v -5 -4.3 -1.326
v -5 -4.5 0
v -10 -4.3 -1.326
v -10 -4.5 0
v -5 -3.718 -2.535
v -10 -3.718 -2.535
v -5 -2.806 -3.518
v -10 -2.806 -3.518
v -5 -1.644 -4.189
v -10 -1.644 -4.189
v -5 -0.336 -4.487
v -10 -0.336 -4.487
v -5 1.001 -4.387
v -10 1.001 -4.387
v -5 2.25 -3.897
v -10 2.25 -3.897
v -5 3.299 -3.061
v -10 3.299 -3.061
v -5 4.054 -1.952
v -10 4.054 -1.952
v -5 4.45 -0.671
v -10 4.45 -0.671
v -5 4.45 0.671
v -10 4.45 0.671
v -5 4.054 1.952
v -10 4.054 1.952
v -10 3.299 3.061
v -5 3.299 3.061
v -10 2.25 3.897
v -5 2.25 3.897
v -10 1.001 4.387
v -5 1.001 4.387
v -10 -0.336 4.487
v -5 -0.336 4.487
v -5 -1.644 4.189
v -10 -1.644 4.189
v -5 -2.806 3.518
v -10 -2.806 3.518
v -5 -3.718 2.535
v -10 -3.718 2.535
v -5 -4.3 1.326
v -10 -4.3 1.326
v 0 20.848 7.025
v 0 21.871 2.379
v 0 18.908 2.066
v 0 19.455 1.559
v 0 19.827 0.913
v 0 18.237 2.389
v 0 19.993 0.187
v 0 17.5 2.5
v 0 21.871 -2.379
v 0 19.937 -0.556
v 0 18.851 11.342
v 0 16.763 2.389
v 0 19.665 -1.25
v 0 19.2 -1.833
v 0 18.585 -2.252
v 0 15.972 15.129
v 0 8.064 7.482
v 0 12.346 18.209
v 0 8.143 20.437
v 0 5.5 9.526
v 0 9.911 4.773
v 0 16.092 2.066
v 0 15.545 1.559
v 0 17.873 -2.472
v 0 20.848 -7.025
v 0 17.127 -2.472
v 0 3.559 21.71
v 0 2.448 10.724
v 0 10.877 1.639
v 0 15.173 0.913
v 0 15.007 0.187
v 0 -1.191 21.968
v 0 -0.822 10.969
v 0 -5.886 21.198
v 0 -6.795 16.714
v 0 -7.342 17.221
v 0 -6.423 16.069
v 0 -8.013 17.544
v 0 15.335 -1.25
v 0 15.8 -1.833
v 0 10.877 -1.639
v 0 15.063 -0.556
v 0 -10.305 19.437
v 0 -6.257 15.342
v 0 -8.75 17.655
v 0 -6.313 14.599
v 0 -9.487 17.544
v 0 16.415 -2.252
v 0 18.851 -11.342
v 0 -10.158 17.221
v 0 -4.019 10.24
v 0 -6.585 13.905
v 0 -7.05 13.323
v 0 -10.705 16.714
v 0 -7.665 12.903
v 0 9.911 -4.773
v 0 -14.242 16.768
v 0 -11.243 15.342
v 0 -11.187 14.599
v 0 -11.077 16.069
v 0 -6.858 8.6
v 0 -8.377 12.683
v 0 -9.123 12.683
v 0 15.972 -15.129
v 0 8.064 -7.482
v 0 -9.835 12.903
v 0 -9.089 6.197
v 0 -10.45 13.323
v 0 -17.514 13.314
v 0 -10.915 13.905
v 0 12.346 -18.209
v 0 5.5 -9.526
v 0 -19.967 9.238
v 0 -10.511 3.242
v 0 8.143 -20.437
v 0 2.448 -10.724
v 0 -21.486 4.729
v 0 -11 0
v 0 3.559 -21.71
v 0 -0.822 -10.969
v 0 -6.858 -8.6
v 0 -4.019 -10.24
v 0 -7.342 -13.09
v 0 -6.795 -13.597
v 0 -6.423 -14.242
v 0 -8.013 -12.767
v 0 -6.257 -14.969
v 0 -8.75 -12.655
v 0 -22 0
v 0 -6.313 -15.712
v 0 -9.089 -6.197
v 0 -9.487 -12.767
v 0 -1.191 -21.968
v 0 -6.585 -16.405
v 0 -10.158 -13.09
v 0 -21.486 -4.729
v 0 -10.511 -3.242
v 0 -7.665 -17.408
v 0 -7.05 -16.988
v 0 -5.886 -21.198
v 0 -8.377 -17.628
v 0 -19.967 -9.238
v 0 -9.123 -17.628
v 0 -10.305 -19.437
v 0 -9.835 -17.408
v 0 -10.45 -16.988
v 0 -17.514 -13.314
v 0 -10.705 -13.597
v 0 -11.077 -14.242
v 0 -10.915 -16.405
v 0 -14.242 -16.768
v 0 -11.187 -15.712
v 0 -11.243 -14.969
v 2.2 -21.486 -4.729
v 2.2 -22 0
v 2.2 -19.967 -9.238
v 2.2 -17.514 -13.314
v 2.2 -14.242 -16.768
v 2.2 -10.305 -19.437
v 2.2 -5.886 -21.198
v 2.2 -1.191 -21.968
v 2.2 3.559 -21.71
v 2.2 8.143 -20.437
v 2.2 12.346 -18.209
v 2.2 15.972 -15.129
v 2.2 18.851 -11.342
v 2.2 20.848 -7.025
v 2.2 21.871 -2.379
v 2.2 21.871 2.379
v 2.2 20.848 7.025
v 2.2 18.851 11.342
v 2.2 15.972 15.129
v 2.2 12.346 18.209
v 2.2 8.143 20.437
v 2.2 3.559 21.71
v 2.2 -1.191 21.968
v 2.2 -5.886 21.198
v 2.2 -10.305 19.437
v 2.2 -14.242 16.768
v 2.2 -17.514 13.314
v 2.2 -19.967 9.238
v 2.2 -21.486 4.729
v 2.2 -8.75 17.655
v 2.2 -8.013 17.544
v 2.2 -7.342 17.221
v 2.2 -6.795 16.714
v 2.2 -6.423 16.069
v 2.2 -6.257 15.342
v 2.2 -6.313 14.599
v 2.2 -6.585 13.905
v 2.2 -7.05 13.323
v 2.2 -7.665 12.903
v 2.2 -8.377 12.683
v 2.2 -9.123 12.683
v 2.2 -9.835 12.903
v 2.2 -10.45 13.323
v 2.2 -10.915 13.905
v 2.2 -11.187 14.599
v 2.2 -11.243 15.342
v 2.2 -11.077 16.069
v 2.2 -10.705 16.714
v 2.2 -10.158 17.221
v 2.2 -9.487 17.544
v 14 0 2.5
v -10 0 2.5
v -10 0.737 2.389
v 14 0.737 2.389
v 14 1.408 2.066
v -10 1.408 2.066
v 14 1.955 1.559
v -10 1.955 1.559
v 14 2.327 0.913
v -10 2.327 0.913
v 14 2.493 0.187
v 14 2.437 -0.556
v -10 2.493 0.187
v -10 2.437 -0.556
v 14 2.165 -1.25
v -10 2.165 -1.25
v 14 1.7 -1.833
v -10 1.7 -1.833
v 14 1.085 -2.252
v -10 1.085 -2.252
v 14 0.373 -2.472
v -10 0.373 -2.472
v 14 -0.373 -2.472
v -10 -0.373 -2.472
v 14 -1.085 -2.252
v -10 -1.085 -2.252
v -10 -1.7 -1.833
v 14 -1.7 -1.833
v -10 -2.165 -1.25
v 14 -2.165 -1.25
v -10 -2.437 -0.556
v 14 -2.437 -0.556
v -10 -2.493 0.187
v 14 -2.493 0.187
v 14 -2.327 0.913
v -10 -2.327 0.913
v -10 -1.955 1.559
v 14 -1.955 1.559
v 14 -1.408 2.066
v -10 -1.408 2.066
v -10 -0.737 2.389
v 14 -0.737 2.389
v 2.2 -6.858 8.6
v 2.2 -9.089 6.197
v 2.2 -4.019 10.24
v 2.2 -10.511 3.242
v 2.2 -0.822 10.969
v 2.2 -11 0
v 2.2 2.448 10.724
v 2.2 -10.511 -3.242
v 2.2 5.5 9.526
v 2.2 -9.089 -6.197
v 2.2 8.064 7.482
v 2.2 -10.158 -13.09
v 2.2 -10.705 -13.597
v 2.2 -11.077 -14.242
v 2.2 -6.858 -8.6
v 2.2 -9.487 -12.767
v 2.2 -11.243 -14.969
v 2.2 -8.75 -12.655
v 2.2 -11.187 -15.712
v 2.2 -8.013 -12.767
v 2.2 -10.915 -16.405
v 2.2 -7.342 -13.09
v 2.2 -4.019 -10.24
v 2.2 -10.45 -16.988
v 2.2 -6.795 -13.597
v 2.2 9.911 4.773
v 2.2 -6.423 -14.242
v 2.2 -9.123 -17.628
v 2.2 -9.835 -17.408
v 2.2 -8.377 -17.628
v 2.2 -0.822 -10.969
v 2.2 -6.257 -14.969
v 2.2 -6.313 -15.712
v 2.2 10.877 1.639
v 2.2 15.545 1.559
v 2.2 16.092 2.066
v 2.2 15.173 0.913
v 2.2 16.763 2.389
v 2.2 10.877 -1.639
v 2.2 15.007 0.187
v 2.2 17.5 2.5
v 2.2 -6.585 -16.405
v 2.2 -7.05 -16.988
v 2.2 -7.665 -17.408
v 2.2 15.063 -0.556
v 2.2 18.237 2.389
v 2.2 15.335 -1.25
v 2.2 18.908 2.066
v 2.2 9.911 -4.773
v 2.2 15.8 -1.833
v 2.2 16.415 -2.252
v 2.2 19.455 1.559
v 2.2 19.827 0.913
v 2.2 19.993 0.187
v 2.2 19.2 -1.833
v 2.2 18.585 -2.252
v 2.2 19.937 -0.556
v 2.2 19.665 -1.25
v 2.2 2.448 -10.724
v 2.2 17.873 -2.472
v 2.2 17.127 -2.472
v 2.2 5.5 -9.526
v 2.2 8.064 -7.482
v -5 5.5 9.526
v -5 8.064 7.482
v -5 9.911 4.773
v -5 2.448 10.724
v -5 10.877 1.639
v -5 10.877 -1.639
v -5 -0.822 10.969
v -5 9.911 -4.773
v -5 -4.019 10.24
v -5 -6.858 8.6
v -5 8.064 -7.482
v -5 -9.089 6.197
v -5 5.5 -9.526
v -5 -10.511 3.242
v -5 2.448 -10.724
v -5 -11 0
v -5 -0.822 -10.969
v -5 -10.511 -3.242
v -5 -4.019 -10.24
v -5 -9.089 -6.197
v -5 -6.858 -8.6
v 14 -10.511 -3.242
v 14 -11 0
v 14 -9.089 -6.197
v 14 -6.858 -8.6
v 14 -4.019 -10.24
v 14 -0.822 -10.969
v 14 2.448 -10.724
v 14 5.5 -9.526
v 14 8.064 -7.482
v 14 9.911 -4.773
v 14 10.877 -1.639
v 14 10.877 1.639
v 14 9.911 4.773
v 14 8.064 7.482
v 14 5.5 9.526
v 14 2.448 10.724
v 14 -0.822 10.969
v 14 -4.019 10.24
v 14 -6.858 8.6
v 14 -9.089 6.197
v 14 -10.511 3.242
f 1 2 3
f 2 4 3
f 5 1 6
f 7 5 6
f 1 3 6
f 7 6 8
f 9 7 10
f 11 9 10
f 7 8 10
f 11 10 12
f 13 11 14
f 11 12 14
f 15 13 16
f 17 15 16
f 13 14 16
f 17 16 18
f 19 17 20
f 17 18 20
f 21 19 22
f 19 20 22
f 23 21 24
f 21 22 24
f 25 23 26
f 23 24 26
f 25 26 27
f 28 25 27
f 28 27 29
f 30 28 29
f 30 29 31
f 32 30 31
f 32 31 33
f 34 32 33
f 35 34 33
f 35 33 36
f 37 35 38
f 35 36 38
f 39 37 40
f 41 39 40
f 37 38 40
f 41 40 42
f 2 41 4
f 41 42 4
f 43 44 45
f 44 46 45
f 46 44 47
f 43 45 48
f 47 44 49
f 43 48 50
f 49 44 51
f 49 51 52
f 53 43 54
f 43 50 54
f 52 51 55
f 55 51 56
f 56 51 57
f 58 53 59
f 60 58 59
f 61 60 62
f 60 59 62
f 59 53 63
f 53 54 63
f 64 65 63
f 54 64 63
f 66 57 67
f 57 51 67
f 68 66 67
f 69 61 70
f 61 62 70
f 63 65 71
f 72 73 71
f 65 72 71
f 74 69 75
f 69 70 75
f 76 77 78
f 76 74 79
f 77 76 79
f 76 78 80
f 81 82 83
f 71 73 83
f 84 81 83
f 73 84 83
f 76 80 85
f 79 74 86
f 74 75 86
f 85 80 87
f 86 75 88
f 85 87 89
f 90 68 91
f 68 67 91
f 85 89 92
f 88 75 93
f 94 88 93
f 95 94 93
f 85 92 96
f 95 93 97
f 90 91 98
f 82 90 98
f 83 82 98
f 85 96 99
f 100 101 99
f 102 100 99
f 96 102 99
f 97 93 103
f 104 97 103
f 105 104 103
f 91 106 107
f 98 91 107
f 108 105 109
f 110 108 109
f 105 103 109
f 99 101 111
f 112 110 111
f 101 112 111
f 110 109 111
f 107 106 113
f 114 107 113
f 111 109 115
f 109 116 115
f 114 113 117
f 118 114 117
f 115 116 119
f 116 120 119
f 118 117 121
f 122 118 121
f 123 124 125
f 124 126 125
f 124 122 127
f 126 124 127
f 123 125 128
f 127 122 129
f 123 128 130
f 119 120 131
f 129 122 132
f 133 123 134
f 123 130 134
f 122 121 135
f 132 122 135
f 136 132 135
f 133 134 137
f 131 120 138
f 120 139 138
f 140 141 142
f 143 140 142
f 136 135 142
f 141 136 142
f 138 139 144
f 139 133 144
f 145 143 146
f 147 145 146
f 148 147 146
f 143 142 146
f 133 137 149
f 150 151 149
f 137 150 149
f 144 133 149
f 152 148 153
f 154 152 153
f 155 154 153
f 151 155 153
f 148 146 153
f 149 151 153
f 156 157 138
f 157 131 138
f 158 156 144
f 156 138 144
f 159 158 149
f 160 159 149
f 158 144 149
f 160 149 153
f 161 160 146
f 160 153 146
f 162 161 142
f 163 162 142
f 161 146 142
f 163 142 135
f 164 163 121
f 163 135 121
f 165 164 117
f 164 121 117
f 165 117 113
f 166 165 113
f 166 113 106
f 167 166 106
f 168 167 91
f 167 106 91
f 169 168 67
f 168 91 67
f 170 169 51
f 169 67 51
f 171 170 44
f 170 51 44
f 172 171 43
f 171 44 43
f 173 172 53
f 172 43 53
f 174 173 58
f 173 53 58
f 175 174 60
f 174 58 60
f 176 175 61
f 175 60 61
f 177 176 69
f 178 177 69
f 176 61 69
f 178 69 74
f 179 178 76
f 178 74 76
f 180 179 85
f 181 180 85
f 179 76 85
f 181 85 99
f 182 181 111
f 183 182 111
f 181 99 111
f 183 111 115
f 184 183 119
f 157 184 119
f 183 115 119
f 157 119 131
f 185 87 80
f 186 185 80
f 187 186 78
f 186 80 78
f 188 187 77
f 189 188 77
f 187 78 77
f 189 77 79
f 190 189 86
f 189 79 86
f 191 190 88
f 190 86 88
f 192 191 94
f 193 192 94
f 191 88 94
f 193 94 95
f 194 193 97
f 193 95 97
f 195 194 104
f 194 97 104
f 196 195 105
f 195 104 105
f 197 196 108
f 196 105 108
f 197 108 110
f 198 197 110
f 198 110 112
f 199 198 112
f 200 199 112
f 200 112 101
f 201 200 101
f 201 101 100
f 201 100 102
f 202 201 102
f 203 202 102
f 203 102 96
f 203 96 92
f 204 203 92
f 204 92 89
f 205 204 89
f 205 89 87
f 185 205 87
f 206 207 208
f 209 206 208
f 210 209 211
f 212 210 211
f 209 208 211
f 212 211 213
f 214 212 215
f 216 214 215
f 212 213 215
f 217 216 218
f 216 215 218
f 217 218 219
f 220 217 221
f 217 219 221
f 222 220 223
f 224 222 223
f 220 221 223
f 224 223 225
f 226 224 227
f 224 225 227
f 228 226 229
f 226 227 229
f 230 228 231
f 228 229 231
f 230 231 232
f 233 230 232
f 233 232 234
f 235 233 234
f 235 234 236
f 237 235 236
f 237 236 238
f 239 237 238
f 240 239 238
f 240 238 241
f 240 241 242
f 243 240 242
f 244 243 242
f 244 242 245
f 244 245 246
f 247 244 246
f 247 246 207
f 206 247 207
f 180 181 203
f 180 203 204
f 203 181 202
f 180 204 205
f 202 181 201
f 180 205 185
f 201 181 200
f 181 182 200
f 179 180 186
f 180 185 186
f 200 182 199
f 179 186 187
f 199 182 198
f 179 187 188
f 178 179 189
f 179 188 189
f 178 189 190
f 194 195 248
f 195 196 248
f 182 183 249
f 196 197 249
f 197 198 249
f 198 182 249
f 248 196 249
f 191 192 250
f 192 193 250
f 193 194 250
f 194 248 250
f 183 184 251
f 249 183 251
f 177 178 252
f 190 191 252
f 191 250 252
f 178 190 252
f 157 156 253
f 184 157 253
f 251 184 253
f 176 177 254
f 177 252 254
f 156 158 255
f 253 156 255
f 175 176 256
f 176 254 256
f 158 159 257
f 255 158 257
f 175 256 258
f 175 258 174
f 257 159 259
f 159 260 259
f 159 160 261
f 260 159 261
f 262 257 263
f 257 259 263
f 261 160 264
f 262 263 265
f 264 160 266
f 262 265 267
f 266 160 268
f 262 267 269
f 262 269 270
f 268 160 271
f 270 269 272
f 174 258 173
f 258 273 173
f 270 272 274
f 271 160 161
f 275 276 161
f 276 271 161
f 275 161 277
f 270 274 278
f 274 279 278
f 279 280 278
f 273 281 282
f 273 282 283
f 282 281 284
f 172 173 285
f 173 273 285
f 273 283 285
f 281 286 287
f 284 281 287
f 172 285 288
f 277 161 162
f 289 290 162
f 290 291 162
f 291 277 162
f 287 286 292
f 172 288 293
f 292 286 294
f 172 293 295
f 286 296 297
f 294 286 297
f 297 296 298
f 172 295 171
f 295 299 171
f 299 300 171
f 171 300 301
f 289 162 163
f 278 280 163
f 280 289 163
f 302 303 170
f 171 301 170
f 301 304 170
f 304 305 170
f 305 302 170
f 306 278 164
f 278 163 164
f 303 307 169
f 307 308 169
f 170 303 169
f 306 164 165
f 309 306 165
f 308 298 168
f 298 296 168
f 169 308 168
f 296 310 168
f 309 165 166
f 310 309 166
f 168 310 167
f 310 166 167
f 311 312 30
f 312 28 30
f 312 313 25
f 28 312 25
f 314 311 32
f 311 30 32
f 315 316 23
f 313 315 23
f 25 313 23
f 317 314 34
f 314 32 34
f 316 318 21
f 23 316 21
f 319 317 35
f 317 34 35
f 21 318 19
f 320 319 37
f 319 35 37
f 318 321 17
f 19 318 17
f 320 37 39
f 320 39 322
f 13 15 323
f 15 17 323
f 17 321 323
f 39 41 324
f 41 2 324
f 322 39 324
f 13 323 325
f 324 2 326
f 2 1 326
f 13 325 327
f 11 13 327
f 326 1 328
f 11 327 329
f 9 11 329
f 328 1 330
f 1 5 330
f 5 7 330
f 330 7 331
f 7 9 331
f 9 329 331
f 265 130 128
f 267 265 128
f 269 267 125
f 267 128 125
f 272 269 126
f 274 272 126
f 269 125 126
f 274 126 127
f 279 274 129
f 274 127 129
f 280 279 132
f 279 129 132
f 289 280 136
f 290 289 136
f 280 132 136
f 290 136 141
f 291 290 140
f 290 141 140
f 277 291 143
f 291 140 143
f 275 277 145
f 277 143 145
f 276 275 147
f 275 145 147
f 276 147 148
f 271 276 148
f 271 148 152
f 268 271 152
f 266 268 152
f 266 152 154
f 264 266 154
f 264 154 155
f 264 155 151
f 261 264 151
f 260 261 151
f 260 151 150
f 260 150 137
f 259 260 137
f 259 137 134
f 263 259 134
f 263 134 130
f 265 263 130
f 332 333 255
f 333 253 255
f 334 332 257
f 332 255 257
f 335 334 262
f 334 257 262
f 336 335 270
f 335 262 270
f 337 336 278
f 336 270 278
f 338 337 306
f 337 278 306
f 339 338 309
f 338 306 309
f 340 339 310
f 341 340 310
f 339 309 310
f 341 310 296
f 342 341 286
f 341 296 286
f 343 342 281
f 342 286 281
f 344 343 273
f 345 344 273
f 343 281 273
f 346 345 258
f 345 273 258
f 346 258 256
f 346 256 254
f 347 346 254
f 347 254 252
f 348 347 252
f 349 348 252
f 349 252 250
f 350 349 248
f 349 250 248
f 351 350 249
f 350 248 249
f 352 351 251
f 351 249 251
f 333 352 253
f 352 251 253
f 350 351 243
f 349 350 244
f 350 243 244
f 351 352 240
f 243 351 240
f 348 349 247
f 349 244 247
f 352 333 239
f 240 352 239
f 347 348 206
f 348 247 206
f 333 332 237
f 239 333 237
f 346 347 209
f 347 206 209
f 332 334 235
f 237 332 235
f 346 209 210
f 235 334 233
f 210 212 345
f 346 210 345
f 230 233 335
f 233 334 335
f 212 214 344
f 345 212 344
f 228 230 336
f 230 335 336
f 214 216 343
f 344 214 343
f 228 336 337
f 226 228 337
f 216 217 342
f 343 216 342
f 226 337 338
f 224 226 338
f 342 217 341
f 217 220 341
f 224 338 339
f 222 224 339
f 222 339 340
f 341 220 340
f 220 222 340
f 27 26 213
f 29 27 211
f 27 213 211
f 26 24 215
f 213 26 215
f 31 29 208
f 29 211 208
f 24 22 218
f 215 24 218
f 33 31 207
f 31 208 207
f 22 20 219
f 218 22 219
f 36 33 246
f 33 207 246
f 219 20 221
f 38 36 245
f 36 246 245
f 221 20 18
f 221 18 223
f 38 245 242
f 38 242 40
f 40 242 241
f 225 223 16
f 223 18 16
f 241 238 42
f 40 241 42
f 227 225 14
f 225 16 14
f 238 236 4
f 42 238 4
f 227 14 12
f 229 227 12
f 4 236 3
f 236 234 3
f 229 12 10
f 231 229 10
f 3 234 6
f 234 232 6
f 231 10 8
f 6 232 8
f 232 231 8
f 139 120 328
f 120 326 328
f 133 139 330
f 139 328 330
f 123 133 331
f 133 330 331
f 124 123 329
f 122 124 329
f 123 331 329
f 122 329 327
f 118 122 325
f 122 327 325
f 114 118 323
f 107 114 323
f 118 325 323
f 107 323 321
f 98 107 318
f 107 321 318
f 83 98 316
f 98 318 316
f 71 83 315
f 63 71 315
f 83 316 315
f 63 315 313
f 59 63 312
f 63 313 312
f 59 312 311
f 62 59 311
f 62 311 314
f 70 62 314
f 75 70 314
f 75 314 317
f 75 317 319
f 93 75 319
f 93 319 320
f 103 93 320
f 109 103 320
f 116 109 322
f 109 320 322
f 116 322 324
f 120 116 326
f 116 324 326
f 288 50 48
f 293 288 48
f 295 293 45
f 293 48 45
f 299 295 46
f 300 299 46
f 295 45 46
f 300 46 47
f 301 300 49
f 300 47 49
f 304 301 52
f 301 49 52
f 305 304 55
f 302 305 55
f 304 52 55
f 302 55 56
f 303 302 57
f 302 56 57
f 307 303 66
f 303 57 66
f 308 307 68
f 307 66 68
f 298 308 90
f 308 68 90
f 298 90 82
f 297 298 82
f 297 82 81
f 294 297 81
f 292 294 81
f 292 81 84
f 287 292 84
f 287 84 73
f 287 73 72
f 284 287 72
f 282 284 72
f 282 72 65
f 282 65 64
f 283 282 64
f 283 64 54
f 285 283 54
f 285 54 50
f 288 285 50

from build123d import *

# Parameters (mm, degrees)
SKETCH_2_R          = 2.5
CUT_EXTRUDE_1_DEPTH = 10
SKETCH_3_R          = 2.5
CUT_EXTRUDE_2_DEPTH = 40.293765409


with BuildPart() as part:
    # 草图1 → 旋转1 (revolve)
    with BuildSketch(Plane.XY):
        Polygon((-10, 0), (14, 0), (14, -11), (2.2, -11), (2.2, -22), (0, -22), (0, -11), (-5, -11), (-5, -4.5), (-10, -4.5), align=None)
    revolve(axis=Axis((-10, 0, 0), (1, 0, 0)))

    # 草图2 → 切除-拉伸1 (cut)
    with BuildSketch(Plane.ZY):
        with Locations((0, 17.5)):
            Circle(SKETCH_2_R)
        with Locations((15.155444566, -8.75)):
            Circle(SKETCH_2_R)
        with Locations((-15.155444566, -8.75)):
            Circle(SKETCH_2_R)
    extrude(amount=-CUT_EXTRUDE_1_DEPTH, mode=Mode.SUBTRACT)

    # 草图3 → 切除-拉伸2 (cut, through all)
    with BuildSketch(Plane.ZY.offset(10)):
        Circle(SKETCH_3_R)
    extrude(amount=-CUT_EXTRUDE_2_DEPTH, mode=Mode.SUBTRACT)


solid = part.part
